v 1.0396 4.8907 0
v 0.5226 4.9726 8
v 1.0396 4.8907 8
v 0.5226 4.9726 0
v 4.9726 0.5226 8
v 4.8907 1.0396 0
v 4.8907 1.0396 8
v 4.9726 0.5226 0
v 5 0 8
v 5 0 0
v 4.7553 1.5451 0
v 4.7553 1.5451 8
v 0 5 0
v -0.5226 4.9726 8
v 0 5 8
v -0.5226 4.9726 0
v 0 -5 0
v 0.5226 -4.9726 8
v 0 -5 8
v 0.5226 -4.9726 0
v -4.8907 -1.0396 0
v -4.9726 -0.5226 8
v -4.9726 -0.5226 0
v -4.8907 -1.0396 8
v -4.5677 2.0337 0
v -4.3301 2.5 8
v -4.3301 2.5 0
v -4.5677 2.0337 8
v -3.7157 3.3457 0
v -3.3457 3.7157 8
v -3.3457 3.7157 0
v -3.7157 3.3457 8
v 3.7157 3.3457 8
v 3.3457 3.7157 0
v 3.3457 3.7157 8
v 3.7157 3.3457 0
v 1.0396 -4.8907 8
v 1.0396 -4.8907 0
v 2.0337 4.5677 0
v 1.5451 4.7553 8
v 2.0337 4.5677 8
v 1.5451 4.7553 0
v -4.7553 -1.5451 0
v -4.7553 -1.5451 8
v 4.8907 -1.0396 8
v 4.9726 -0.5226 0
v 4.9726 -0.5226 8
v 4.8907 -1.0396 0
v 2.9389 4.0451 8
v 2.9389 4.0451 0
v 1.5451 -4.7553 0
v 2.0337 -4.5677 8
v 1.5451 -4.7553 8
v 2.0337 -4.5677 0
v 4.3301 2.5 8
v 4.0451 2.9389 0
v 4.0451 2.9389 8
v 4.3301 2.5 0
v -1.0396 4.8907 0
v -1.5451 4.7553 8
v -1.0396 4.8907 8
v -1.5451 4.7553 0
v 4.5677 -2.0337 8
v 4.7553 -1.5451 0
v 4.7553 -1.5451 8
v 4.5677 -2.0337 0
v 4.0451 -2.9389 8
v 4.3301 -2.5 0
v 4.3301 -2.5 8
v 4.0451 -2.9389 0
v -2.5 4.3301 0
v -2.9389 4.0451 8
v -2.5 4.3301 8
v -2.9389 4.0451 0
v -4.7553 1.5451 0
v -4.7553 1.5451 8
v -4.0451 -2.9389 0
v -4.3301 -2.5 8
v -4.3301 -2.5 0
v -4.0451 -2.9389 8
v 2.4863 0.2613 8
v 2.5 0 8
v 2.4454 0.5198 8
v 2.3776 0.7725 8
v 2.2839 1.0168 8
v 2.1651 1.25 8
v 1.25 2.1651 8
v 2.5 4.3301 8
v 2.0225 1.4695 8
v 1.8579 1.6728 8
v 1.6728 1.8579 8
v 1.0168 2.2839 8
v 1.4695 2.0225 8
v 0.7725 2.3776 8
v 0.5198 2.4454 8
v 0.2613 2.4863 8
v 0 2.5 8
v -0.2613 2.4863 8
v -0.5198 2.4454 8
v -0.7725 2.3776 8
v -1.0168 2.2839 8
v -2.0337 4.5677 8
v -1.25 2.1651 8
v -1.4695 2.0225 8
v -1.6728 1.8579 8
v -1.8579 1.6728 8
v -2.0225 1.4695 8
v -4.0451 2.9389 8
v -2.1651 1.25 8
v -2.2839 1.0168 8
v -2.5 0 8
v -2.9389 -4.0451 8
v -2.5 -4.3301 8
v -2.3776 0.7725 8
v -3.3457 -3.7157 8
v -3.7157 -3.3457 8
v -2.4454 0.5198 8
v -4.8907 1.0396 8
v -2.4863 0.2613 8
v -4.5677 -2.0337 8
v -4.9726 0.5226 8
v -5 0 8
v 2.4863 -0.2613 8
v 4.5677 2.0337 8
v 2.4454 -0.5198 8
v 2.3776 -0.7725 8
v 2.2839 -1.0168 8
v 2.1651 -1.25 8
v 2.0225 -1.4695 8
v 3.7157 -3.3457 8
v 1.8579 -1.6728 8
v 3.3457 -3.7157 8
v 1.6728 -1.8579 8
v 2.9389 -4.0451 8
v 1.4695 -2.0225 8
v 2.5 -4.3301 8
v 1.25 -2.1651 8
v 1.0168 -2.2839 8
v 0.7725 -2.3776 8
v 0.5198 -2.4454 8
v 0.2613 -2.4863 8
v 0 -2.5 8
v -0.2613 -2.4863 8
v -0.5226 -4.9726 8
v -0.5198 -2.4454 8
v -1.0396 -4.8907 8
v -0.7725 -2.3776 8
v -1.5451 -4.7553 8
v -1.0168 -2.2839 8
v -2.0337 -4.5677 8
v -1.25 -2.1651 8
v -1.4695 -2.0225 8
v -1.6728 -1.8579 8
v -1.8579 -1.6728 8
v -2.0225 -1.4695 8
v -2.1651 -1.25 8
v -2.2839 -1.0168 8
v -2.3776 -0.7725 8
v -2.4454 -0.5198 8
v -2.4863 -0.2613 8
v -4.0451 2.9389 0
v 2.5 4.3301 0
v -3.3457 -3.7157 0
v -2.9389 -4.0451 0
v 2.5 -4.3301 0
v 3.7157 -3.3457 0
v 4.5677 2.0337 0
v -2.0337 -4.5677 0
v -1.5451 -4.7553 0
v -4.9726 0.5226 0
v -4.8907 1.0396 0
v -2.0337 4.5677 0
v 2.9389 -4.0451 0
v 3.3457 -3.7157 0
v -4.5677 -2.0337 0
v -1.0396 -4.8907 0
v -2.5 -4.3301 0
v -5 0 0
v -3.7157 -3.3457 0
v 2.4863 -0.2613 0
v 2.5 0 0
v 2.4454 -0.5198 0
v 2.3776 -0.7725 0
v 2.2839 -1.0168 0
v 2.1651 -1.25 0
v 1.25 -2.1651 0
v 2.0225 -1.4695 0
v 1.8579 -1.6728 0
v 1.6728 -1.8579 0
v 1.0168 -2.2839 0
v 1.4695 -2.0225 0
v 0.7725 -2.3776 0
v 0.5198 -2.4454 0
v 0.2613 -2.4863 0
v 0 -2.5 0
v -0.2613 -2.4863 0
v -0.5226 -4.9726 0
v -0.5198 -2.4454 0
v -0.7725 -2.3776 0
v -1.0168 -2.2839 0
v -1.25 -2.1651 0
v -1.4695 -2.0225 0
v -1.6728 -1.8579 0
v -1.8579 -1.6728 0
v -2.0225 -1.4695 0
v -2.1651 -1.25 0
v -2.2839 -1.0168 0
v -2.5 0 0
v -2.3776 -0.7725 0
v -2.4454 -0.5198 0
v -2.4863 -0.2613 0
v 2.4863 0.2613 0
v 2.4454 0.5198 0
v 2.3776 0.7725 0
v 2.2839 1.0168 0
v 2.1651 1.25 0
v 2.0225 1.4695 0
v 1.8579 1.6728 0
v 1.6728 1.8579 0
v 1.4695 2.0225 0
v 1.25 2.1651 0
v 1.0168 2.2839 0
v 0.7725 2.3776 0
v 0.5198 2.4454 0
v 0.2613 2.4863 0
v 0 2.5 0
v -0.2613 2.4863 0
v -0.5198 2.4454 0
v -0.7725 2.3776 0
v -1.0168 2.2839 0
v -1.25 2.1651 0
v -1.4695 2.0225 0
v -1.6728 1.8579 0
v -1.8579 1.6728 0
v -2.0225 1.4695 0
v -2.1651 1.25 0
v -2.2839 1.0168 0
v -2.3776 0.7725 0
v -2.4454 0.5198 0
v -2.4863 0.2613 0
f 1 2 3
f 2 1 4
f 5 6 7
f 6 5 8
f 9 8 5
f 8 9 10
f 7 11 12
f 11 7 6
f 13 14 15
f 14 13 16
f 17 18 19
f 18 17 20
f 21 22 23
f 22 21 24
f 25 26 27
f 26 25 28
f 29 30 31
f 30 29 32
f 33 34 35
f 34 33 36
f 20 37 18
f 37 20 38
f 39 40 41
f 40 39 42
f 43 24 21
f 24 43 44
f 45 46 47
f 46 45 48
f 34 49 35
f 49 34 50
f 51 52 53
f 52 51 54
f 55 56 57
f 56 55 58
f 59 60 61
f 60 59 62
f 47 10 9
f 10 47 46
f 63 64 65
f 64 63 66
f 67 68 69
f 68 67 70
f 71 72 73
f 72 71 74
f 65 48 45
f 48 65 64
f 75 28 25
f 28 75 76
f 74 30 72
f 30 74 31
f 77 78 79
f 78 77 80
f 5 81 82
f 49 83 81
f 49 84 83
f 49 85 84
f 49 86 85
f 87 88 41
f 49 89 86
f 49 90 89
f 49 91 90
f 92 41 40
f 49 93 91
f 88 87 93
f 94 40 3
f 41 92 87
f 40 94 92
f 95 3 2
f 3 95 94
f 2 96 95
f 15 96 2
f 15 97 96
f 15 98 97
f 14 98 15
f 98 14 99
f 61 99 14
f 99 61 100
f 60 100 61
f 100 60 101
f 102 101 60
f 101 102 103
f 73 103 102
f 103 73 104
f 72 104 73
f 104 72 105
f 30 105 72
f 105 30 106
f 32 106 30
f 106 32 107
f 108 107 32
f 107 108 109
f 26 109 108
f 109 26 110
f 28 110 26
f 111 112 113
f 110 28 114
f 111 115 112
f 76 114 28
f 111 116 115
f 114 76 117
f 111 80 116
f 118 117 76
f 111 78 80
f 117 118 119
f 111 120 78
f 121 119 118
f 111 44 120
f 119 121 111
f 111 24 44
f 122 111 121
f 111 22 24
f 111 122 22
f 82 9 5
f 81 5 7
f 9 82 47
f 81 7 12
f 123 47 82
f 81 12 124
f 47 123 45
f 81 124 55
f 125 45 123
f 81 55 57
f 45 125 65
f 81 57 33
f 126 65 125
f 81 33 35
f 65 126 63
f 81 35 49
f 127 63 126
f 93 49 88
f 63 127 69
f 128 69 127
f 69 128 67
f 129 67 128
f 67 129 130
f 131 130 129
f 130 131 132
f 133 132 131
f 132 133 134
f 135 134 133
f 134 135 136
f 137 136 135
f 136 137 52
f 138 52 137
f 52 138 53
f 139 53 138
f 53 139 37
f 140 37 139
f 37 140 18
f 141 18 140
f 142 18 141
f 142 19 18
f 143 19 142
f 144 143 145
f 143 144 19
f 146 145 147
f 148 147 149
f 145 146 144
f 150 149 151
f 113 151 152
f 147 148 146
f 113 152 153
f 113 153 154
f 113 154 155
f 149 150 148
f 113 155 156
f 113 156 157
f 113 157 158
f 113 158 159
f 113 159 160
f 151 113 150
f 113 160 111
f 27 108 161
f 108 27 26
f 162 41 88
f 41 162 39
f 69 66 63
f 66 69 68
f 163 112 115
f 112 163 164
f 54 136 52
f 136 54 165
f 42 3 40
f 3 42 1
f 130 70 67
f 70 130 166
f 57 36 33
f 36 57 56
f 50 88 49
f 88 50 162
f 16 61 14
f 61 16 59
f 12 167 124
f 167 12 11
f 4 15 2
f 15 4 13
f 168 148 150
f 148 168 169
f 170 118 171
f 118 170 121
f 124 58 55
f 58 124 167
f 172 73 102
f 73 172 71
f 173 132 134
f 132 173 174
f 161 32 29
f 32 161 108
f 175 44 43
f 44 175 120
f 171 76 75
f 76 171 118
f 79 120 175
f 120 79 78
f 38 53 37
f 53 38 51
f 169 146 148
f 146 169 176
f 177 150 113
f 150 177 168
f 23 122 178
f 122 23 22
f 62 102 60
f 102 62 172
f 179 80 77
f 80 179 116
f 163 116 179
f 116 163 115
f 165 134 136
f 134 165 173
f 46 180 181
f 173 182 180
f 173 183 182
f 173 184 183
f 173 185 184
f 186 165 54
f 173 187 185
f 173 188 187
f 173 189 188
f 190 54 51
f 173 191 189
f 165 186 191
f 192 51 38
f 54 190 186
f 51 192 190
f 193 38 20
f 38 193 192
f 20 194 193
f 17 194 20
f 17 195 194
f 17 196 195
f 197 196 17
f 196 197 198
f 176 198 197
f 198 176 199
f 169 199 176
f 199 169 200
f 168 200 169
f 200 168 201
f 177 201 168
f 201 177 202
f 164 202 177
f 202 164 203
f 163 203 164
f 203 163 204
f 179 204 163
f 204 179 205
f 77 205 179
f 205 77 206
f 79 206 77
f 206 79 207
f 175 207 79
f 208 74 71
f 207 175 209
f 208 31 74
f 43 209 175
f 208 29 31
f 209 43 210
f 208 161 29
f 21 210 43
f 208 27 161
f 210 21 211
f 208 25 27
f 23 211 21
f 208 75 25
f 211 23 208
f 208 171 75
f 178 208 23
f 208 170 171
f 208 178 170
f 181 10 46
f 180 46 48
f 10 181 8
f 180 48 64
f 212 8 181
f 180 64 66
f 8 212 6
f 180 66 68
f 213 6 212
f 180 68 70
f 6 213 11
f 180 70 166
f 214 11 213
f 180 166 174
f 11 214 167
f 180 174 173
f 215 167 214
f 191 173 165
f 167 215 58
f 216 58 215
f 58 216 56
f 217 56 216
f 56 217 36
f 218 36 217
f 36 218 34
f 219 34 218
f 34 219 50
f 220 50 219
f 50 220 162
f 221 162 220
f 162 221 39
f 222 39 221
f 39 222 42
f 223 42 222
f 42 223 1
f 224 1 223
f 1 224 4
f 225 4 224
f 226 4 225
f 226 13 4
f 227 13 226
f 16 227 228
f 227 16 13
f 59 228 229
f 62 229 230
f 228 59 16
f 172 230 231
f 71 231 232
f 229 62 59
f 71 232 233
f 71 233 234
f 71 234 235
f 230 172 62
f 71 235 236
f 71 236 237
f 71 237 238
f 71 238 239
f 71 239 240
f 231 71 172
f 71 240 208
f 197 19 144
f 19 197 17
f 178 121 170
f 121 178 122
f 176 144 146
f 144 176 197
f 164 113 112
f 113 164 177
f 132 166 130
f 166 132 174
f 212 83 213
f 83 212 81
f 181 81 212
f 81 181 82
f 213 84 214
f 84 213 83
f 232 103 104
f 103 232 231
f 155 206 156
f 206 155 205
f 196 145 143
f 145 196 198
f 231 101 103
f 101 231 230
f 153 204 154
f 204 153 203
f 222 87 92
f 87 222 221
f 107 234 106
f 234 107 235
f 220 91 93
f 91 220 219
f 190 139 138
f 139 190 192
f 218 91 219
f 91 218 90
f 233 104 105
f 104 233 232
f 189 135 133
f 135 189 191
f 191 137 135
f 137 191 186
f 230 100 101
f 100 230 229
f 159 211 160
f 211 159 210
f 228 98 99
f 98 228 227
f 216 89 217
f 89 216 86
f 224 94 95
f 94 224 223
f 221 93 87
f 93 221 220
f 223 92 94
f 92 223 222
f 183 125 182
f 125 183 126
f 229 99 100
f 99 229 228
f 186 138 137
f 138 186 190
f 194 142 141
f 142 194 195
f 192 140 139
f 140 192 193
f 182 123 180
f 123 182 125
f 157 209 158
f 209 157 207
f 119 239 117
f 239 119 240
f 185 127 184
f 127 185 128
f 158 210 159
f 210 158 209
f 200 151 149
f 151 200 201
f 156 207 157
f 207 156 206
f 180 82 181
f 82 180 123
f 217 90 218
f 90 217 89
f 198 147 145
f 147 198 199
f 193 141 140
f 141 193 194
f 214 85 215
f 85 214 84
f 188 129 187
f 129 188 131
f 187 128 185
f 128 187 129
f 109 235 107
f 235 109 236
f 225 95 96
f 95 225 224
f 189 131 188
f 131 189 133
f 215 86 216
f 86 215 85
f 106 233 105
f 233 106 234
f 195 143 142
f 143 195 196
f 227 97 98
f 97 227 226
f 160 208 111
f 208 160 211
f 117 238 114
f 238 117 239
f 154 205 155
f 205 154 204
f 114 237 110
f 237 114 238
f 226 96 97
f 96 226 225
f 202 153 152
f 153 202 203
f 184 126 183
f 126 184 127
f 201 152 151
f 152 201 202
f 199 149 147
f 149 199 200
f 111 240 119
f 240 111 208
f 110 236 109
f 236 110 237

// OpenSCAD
// Axle spacer tube.
$fn = 60;
eps = 0.02;
inner_d = 5;
outer_d = 10;
length = 8;
difference() { cylinder(d = outer_d, h = length); translate([0,0,-eps]) cylinder(d = inner_d, h = length + 2 * eps); }
